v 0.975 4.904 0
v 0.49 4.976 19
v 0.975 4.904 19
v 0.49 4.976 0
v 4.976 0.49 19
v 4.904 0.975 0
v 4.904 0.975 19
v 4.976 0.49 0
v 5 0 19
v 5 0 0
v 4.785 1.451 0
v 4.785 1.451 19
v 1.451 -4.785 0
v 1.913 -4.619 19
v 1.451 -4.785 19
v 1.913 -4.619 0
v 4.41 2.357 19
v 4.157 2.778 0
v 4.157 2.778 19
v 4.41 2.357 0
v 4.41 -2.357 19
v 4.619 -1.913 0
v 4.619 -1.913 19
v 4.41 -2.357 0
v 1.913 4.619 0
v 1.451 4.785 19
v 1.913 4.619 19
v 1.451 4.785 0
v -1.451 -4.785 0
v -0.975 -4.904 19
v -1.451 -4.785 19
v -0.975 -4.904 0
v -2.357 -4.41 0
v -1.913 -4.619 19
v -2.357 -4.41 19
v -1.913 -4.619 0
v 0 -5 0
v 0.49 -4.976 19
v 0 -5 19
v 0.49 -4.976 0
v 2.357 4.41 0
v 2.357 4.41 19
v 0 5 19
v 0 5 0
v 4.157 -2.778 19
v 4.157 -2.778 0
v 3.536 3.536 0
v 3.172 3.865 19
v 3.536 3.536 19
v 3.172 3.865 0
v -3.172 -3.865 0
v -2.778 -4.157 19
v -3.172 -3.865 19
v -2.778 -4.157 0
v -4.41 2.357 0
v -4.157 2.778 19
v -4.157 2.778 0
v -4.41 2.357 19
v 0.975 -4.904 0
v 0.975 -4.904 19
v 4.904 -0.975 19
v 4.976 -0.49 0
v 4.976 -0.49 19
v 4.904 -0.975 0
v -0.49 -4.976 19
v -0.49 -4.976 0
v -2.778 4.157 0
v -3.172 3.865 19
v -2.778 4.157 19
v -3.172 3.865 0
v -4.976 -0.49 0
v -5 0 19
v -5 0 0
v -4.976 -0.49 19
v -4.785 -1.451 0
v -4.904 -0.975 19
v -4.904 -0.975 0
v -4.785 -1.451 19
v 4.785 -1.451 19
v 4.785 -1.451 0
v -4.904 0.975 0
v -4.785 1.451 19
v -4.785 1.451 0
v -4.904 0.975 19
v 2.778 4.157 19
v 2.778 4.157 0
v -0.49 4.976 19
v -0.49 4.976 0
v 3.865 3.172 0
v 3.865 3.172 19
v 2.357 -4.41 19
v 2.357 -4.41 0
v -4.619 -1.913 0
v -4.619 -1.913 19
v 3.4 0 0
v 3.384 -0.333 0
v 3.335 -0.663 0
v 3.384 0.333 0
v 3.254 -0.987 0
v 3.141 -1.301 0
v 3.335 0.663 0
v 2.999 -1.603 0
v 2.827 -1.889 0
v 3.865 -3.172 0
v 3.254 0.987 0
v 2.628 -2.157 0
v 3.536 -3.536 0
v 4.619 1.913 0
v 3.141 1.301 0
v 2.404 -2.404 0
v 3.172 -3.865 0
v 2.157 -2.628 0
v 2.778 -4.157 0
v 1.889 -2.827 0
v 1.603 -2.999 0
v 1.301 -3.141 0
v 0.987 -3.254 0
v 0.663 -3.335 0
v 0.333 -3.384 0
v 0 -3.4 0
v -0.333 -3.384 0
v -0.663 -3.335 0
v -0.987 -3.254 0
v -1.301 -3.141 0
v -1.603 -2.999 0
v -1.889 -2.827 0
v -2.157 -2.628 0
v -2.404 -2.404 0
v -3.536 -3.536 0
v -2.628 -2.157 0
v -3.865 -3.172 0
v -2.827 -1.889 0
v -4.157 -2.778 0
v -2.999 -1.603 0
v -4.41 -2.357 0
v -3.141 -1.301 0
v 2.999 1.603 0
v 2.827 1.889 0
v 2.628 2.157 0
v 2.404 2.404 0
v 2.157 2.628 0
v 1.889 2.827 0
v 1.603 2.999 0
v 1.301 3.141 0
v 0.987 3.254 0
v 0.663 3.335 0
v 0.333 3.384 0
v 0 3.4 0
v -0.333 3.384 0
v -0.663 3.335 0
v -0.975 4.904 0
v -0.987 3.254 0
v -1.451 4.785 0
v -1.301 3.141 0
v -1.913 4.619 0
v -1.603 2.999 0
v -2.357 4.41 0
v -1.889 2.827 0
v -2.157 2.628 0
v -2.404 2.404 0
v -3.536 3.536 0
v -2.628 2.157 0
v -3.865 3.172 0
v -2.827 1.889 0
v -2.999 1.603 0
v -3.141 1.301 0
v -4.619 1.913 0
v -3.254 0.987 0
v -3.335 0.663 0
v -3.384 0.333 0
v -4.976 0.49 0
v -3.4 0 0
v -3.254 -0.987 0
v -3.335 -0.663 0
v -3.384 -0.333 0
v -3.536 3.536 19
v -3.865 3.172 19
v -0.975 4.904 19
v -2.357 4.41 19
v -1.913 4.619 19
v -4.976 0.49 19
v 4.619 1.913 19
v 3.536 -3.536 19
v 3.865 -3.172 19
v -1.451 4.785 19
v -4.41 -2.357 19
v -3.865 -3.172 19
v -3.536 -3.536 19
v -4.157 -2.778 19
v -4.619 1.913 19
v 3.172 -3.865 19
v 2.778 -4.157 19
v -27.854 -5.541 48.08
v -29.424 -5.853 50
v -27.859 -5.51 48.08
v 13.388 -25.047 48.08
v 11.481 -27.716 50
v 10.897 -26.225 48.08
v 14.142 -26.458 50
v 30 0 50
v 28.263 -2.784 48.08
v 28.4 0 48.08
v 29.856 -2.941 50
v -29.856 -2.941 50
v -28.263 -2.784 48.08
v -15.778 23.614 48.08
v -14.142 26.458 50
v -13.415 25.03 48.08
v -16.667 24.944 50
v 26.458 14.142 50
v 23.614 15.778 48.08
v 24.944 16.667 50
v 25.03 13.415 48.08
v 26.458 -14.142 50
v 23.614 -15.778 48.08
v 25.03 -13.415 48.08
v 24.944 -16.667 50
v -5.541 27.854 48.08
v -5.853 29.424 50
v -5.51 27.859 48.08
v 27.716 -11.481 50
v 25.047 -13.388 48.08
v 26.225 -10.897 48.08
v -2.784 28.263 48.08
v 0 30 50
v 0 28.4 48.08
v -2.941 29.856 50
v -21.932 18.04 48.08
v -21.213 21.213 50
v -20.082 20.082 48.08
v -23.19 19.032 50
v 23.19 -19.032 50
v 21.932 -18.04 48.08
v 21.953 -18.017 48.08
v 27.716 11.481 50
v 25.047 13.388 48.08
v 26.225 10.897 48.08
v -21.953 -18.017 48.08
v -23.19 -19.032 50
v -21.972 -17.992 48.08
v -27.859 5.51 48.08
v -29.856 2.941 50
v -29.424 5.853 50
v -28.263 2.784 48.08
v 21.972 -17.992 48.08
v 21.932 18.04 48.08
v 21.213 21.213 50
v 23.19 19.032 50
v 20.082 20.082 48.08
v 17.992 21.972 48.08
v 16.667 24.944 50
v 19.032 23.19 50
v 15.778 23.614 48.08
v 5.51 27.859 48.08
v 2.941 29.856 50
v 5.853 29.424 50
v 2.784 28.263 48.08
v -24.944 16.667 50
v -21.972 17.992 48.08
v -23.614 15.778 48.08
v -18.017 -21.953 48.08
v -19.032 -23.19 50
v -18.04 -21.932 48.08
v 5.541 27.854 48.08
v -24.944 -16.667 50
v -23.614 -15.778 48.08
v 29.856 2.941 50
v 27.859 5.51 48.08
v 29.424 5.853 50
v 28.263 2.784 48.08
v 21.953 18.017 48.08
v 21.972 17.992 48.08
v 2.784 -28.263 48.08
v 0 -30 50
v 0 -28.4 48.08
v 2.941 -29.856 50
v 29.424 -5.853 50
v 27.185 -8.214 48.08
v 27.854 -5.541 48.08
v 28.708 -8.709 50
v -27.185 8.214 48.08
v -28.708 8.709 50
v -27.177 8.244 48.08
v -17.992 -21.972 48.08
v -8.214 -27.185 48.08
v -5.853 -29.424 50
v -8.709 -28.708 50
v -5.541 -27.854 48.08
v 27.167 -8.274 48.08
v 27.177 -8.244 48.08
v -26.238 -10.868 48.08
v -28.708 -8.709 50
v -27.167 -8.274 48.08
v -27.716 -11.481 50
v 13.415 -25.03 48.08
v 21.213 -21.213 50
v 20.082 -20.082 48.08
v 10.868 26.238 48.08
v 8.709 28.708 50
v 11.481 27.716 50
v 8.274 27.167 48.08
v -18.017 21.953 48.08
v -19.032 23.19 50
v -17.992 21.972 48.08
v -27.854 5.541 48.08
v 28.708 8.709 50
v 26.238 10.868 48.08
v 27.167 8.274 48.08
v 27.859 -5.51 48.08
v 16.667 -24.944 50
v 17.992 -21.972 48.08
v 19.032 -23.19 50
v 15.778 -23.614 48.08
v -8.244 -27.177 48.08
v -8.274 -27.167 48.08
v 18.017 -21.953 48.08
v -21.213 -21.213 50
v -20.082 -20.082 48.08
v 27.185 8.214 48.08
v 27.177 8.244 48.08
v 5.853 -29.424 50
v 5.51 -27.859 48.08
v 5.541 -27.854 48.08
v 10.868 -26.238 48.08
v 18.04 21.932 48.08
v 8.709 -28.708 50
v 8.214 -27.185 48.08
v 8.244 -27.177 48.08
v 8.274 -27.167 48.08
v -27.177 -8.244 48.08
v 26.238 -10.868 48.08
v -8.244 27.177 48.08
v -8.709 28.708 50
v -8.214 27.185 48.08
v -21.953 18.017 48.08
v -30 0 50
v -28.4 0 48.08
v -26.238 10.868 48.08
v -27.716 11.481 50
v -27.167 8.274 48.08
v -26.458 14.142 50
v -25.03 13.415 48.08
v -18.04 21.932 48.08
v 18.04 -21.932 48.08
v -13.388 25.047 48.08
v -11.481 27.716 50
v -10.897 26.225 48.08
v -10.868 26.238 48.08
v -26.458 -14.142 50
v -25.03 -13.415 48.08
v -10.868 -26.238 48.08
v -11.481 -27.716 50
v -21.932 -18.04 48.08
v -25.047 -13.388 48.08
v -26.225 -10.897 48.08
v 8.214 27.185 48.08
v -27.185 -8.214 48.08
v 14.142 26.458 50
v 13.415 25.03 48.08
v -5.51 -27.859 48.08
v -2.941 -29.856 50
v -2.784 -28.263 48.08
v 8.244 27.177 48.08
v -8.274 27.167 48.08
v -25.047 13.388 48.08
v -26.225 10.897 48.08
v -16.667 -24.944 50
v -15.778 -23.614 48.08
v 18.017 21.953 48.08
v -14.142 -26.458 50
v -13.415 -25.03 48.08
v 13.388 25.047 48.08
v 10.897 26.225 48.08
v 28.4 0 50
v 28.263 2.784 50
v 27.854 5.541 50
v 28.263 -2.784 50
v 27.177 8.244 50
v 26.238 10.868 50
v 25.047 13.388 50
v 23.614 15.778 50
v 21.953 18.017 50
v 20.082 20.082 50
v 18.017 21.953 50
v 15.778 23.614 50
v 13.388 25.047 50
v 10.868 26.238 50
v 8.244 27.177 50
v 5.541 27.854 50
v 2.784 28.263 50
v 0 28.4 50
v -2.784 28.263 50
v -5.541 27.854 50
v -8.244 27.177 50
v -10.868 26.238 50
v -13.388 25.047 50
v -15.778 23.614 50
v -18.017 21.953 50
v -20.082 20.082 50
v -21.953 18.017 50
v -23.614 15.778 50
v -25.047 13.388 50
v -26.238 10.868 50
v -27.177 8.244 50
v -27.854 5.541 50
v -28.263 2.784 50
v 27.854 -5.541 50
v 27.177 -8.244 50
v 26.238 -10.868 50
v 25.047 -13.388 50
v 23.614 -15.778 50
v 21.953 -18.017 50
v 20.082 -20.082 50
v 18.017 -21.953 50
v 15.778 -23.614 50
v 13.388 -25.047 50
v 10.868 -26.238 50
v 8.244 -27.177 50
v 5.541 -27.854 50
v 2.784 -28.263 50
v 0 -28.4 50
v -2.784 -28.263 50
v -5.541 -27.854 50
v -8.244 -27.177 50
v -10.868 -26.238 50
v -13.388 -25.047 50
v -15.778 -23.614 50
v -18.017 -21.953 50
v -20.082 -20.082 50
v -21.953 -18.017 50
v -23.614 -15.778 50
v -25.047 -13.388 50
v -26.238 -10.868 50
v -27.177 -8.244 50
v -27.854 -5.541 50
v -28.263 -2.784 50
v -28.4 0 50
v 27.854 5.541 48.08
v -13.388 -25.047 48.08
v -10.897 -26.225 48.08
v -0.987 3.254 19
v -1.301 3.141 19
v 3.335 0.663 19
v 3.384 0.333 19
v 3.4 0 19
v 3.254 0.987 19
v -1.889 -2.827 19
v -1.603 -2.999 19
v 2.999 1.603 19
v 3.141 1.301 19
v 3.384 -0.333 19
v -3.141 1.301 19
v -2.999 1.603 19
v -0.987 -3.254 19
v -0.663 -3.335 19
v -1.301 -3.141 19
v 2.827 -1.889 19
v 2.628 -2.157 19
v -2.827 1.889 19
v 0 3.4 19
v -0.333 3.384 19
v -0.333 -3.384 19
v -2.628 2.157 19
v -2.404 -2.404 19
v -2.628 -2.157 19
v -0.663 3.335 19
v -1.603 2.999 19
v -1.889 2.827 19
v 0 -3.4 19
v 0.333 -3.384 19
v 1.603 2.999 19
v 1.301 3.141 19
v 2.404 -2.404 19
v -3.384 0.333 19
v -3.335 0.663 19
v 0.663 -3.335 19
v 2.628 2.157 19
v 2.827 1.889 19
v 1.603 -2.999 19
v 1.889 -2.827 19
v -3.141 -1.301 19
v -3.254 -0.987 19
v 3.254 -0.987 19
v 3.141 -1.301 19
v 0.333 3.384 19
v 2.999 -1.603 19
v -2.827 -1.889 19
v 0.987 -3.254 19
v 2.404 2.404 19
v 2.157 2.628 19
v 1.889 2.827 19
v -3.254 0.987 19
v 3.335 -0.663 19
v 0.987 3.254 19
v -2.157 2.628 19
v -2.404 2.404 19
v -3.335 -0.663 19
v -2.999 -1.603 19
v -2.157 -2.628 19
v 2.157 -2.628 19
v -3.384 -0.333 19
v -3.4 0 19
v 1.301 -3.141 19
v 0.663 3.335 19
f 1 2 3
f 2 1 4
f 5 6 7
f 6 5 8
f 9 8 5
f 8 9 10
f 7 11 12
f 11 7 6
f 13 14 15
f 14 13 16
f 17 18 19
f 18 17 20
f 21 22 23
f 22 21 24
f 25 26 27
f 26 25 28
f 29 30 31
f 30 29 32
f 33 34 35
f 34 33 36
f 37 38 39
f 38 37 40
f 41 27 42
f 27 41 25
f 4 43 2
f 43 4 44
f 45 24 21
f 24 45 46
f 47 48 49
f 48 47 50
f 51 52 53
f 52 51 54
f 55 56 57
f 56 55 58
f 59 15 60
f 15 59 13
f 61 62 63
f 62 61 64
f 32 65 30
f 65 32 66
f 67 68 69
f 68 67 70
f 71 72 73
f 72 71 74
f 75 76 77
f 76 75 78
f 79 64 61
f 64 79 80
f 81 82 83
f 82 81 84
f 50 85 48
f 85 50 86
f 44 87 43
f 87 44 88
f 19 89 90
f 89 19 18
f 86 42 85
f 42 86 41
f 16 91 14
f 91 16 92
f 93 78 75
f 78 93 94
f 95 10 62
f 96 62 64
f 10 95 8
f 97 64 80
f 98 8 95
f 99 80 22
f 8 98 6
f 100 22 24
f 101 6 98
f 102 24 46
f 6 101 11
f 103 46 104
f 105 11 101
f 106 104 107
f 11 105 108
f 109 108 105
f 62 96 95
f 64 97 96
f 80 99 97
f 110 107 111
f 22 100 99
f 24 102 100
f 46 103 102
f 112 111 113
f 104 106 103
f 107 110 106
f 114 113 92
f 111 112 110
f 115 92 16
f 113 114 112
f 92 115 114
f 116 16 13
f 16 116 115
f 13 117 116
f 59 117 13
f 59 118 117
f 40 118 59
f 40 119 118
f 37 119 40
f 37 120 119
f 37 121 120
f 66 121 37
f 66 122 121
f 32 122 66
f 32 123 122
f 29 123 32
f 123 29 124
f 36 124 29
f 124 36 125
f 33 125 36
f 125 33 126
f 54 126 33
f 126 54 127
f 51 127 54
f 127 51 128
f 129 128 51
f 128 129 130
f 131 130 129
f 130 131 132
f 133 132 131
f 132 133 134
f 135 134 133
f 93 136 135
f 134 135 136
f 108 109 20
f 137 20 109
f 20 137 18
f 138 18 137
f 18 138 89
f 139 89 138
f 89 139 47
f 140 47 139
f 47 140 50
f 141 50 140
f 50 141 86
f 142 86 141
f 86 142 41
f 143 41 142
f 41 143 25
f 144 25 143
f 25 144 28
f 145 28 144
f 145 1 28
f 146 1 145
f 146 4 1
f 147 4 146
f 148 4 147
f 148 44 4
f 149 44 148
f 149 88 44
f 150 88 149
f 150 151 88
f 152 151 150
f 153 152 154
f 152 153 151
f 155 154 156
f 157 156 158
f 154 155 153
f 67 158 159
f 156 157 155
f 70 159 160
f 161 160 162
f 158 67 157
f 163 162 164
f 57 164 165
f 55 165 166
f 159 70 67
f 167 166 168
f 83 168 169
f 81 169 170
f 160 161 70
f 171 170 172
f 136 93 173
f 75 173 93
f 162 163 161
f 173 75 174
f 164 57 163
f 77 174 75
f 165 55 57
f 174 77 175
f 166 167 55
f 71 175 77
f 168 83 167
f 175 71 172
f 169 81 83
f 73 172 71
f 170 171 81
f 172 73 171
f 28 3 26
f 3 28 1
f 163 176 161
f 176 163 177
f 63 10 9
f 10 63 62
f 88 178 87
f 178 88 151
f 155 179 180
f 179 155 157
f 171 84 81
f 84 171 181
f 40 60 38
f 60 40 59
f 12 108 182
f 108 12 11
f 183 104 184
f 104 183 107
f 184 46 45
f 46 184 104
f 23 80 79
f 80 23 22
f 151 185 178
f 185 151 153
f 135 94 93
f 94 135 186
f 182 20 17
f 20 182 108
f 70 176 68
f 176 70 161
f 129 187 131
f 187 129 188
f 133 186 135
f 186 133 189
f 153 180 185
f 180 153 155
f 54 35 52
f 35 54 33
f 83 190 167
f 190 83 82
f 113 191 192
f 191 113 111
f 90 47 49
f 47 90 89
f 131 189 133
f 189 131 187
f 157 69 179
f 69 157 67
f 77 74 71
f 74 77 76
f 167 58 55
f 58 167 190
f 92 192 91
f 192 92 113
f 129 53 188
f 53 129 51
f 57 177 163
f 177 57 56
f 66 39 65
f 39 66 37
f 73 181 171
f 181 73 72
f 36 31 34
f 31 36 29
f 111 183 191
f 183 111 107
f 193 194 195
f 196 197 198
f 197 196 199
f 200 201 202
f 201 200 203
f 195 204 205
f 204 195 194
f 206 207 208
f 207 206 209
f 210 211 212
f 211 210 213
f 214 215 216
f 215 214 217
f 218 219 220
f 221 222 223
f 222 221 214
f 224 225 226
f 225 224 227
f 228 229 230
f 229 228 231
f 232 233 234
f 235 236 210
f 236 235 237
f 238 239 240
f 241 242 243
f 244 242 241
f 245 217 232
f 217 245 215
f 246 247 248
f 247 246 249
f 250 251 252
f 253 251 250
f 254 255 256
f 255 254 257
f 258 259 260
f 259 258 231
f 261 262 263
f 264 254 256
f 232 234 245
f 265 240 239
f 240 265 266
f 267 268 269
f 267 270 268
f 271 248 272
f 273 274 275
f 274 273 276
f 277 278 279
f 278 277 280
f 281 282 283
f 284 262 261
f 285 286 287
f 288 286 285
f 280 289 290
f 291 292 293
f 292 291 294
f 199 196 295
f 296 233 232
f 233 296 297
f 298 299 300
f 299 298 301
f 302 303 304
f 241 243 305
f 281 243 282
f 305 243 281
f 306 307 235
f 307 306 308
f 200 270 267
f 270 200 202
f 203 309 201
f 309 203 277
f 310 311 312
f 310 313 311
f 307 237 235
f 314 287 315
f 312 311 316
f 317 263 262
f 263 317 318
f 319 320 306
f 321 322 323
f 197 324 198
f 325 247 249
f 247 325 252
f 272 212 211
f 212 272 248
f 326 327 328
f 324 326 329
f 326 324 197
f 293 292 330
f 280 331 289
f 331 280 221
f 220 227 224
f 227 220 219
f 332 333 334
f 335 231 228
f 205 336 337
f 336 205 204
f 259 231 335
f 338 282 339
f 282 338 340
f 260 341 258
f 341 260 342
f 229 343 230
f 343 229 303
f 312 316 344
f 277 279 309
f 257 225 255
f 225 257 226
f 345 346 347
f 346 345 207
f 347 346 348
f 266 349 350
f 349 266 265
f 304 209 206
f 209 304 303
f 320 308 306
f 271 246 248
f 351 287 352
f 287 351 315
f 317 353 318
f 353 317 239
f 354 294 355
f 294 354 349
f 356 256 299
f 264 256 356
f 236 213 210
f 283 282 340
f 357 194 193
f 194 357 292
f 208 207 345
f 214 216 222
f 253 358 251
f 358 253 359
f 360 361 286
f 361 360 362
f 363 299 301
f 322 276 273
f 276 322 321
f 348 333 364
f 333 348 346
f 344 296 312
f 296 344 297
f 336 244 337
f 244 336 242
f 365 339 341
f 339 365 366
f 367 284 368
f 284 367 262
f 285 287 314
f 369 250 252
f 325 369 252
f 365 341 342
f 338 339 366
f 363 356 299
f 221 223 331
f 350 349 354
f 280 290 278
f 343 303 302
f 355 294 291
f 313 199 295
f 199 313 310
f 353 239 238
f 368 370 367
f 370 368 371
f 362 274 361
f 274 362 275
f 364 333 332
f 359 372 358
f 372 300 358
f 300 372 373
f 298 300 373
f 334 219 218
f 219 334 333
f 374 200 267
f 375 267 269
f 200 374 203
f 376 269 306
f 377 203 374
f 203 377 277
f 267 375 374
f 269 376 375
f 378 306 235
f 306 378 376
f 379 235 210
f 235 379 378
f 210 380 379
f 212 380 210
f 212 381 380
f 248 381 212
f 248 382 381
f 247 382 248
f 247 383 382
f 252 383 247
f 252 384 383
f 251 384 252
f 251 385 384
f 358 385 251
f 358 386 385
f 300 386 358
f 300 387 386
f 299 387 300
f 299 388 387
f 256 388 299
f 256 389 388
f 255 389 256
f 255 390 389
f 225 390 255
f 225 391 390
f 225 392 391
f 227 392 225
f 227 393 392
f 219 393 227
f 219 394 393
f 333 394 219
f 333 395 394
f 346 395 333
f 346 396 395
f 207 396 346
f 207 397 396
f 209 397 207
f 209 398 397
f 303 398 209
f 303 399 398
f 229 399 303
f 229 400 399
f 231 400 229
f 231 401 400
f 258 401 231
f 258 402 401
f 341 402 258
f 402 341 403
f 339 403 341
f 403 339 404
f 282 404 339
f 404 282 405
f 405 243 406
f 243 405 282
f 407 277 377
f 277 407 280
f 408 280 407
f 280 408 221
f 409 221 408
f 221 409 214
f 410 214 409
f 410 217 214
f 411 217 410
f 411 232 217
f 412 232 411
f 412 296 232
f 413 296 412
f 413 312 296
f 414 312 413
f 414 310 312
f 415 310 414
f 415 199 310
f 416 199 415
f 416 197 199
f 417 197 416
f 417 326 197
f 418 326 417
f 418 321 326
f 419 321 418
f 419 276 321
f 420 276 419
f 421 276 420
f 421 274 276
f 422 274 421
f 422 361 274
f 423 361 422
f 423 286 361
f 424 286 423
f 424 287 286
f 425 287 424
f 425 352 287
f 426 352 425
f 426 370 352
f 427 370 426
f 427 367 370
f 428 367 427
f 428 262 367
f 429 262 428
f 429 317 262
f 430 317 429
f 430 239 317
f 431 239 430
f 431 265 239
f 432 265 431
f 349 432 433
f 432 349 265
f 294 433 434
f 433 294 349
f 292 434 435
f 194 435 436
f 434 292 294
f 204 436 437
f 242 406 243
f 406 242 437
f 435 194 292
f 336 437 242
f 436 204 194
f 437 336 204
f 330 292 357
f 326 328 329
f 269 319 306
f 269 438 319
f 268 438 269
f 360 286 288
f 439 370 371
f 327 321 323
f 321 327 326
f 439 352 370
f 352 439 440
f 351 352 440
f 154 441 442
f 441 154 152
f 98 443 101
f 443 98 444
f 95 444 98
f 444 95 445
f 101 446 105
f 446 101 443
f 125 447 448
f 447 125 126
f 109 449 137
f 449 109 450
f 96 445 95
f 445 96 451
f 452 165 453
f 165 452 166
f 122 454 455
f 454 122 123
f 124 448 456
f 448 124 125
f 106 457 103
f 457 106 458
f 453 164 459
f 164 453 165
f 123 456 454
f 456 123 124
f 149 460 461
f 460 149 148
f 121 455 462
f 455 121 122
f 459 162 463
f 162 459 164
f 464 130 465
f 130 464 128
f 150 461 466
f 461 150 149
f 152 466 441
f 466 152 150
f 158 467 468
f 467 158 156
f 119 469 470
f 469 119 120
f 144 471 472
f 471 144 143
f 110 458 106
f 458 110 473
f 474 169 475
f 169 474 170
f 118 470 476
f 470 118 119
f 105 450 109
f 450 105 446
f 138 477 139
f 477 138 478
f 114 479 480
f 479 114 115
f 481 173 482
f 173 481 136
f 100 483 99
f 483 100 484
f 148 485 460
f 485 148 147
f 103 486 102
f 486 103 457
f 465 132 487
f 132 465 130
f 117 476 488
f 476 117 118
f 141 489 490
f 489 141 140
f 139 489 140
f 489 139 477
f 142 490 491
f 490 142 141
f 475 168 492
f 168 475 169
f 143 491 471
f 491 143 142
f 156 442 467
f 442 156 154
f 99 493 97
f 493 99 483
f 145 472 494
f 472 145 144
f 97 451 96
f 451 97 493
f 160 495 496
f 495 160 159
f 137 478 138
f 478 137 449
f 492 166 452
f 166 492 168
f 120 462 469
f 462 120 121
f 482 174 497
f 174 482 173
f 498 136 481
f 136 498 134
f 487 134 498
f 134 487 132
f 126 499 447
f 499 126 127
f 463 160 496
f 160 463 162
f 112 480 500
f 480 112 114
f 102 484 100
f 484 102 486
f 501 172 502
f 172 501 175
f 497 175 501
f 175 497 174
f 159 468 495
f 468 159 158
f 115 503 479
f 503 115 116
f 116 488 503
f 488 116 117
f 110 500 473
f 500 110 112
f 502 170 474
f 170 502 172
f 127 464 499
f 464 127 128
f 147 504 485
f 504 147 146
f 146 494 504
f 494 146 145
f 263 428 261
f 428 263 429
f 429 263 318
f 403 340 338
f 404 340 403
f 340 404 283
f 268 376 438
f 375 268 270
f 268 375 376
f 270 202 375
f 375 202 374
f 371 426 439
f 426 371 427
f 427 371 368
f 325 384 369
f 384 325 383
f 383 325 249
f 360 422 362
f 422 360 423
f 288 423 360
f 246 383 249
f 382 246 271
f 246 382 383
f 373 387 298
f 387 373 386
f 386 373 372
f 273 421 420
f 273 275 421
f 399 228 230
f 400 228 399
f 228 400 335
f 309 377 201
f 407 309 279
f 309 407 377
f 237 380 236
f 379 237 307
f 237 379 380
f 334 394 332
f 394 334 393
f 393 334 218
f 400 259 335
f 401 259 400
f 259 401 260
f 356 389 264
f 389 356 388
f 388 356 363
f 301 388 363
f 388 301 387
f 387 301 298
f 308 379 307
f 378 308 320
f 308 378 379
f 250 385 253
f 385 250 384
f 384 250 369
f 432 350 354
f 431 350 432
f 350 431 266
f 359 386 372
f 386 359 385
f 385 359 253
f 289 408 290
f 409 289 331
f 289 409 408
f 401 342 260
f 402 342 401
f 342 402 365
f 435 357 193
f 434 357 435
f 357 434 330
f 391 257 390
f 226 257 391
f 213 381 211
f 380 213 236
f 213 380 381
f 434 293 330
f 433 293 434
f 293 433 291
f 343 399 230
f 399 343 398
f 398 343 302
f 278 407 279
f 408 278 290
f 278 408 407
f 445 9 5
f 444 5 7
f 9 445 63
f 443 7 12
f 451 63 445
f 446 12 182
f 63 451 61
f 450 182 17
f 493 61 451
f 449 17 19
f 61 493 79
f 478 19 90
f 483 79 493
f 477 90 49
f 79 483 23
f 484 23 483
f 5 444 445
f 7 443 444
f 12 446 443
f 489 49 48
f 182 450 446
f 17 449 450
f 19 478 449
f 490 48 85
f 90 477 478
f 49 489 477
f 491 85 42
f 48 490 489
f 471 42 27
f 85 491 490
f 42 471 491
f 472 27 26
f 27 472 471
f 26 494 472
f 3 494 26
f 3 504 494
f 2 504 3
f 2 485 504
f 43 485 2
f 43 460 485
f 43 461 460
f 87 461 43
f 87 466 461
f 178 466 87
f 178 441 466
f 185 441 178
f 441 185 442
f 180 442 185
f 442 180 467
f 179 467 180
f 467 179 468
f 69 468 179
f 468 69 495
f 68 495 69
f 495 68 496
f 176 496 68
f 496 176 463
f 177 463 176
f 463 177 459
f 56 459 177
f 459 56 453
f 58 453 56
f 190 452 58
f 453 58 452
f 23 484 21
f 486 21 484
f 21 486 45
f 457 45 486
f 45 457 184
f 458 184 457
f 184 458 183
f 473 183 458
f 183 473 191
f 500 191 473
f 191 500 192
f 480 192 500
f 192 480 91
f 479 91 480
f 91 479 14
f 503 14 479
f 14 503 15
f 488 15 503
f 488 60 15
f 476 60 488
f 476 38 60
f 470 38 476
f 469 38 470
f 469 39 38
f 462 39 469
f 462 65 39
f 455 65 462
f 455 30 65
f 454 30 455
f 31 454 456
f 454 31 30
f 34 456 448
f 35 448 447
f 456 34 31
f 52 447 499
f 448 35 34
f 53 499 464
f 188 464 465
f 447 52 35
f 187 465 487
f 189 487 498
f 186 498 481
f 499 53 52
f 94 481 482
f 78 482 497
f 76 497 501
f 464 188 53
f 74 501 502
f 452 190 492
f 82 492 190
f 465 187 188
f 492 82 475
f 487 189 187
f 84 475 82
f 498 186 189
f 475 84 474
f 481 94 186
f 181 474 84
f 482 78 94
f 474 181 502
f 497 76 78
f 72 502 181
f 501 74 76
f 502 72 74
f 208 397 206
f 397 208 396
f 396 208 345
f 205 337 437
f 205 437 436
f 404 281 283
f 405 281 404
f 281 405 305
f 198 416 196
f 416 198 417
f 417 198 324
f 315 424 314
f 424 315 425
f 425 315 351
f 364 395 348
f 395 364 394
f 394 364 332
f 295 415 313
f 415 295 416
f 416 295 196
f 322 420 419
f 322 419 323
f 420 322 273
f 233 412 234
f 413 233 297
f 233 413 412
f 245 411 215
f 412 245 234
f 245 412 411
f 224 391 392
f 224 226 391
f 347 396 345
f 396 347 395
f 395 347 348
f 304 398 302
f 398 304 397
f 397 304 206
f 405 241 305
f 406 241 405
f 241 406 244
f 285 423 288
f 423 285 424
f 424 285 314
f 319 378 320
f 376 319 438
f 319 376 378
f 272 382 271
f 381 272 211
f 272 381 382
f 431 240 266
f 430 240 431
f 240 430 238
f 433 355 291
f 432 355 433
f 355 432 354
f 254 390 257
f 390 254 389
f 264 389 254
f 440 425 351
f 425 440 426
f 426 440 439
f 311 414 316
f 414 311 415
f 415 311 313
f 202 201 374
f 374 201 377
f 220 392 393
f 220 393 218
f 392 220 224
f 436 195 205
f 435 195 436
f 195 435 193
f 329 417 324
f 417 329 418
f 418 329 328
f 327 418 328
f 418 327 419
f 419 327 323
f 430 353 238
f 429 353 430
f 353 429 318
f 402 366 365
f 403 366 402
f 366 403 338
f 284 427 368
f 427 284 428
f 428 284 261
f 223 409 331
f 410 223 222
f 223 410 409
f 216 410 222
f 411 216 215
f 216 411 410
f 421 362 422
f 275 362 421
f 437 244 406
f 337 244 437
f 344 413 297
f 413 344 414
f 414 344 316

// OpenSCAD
// Funnel - a spout (tube) sitting below a conical section, open at both ends for fluid flow.
// NOVEL general part for a lab or craft. DO NOT use in contact with skin or food.
//

spout_d = 10;
spout_l = 20;
cone_d  = 60;
wall    = 1.6;

$fn = 64;

ib = spout_d - 2 * wall;          // spout bore
ic = cone_d - 2 * wall;           // cone inner diameter at the spout join

difference() {
    union() {
        cylinder(h = spout_l, d = spout_d);                 // spout
        translate([0, 0, spout_l]) cylinder(h = 30, d1 = spout_d, d2 = cone_d);  // cone
    }
    translate([0, 0, -1]) cylinder(h = spout_l + 2, d = ib);                     // bore through spout
    translate([0, 0, spout_l - 1]) cylinder(h = 32, d = ic);                     // cone inner space to the spout join
}
